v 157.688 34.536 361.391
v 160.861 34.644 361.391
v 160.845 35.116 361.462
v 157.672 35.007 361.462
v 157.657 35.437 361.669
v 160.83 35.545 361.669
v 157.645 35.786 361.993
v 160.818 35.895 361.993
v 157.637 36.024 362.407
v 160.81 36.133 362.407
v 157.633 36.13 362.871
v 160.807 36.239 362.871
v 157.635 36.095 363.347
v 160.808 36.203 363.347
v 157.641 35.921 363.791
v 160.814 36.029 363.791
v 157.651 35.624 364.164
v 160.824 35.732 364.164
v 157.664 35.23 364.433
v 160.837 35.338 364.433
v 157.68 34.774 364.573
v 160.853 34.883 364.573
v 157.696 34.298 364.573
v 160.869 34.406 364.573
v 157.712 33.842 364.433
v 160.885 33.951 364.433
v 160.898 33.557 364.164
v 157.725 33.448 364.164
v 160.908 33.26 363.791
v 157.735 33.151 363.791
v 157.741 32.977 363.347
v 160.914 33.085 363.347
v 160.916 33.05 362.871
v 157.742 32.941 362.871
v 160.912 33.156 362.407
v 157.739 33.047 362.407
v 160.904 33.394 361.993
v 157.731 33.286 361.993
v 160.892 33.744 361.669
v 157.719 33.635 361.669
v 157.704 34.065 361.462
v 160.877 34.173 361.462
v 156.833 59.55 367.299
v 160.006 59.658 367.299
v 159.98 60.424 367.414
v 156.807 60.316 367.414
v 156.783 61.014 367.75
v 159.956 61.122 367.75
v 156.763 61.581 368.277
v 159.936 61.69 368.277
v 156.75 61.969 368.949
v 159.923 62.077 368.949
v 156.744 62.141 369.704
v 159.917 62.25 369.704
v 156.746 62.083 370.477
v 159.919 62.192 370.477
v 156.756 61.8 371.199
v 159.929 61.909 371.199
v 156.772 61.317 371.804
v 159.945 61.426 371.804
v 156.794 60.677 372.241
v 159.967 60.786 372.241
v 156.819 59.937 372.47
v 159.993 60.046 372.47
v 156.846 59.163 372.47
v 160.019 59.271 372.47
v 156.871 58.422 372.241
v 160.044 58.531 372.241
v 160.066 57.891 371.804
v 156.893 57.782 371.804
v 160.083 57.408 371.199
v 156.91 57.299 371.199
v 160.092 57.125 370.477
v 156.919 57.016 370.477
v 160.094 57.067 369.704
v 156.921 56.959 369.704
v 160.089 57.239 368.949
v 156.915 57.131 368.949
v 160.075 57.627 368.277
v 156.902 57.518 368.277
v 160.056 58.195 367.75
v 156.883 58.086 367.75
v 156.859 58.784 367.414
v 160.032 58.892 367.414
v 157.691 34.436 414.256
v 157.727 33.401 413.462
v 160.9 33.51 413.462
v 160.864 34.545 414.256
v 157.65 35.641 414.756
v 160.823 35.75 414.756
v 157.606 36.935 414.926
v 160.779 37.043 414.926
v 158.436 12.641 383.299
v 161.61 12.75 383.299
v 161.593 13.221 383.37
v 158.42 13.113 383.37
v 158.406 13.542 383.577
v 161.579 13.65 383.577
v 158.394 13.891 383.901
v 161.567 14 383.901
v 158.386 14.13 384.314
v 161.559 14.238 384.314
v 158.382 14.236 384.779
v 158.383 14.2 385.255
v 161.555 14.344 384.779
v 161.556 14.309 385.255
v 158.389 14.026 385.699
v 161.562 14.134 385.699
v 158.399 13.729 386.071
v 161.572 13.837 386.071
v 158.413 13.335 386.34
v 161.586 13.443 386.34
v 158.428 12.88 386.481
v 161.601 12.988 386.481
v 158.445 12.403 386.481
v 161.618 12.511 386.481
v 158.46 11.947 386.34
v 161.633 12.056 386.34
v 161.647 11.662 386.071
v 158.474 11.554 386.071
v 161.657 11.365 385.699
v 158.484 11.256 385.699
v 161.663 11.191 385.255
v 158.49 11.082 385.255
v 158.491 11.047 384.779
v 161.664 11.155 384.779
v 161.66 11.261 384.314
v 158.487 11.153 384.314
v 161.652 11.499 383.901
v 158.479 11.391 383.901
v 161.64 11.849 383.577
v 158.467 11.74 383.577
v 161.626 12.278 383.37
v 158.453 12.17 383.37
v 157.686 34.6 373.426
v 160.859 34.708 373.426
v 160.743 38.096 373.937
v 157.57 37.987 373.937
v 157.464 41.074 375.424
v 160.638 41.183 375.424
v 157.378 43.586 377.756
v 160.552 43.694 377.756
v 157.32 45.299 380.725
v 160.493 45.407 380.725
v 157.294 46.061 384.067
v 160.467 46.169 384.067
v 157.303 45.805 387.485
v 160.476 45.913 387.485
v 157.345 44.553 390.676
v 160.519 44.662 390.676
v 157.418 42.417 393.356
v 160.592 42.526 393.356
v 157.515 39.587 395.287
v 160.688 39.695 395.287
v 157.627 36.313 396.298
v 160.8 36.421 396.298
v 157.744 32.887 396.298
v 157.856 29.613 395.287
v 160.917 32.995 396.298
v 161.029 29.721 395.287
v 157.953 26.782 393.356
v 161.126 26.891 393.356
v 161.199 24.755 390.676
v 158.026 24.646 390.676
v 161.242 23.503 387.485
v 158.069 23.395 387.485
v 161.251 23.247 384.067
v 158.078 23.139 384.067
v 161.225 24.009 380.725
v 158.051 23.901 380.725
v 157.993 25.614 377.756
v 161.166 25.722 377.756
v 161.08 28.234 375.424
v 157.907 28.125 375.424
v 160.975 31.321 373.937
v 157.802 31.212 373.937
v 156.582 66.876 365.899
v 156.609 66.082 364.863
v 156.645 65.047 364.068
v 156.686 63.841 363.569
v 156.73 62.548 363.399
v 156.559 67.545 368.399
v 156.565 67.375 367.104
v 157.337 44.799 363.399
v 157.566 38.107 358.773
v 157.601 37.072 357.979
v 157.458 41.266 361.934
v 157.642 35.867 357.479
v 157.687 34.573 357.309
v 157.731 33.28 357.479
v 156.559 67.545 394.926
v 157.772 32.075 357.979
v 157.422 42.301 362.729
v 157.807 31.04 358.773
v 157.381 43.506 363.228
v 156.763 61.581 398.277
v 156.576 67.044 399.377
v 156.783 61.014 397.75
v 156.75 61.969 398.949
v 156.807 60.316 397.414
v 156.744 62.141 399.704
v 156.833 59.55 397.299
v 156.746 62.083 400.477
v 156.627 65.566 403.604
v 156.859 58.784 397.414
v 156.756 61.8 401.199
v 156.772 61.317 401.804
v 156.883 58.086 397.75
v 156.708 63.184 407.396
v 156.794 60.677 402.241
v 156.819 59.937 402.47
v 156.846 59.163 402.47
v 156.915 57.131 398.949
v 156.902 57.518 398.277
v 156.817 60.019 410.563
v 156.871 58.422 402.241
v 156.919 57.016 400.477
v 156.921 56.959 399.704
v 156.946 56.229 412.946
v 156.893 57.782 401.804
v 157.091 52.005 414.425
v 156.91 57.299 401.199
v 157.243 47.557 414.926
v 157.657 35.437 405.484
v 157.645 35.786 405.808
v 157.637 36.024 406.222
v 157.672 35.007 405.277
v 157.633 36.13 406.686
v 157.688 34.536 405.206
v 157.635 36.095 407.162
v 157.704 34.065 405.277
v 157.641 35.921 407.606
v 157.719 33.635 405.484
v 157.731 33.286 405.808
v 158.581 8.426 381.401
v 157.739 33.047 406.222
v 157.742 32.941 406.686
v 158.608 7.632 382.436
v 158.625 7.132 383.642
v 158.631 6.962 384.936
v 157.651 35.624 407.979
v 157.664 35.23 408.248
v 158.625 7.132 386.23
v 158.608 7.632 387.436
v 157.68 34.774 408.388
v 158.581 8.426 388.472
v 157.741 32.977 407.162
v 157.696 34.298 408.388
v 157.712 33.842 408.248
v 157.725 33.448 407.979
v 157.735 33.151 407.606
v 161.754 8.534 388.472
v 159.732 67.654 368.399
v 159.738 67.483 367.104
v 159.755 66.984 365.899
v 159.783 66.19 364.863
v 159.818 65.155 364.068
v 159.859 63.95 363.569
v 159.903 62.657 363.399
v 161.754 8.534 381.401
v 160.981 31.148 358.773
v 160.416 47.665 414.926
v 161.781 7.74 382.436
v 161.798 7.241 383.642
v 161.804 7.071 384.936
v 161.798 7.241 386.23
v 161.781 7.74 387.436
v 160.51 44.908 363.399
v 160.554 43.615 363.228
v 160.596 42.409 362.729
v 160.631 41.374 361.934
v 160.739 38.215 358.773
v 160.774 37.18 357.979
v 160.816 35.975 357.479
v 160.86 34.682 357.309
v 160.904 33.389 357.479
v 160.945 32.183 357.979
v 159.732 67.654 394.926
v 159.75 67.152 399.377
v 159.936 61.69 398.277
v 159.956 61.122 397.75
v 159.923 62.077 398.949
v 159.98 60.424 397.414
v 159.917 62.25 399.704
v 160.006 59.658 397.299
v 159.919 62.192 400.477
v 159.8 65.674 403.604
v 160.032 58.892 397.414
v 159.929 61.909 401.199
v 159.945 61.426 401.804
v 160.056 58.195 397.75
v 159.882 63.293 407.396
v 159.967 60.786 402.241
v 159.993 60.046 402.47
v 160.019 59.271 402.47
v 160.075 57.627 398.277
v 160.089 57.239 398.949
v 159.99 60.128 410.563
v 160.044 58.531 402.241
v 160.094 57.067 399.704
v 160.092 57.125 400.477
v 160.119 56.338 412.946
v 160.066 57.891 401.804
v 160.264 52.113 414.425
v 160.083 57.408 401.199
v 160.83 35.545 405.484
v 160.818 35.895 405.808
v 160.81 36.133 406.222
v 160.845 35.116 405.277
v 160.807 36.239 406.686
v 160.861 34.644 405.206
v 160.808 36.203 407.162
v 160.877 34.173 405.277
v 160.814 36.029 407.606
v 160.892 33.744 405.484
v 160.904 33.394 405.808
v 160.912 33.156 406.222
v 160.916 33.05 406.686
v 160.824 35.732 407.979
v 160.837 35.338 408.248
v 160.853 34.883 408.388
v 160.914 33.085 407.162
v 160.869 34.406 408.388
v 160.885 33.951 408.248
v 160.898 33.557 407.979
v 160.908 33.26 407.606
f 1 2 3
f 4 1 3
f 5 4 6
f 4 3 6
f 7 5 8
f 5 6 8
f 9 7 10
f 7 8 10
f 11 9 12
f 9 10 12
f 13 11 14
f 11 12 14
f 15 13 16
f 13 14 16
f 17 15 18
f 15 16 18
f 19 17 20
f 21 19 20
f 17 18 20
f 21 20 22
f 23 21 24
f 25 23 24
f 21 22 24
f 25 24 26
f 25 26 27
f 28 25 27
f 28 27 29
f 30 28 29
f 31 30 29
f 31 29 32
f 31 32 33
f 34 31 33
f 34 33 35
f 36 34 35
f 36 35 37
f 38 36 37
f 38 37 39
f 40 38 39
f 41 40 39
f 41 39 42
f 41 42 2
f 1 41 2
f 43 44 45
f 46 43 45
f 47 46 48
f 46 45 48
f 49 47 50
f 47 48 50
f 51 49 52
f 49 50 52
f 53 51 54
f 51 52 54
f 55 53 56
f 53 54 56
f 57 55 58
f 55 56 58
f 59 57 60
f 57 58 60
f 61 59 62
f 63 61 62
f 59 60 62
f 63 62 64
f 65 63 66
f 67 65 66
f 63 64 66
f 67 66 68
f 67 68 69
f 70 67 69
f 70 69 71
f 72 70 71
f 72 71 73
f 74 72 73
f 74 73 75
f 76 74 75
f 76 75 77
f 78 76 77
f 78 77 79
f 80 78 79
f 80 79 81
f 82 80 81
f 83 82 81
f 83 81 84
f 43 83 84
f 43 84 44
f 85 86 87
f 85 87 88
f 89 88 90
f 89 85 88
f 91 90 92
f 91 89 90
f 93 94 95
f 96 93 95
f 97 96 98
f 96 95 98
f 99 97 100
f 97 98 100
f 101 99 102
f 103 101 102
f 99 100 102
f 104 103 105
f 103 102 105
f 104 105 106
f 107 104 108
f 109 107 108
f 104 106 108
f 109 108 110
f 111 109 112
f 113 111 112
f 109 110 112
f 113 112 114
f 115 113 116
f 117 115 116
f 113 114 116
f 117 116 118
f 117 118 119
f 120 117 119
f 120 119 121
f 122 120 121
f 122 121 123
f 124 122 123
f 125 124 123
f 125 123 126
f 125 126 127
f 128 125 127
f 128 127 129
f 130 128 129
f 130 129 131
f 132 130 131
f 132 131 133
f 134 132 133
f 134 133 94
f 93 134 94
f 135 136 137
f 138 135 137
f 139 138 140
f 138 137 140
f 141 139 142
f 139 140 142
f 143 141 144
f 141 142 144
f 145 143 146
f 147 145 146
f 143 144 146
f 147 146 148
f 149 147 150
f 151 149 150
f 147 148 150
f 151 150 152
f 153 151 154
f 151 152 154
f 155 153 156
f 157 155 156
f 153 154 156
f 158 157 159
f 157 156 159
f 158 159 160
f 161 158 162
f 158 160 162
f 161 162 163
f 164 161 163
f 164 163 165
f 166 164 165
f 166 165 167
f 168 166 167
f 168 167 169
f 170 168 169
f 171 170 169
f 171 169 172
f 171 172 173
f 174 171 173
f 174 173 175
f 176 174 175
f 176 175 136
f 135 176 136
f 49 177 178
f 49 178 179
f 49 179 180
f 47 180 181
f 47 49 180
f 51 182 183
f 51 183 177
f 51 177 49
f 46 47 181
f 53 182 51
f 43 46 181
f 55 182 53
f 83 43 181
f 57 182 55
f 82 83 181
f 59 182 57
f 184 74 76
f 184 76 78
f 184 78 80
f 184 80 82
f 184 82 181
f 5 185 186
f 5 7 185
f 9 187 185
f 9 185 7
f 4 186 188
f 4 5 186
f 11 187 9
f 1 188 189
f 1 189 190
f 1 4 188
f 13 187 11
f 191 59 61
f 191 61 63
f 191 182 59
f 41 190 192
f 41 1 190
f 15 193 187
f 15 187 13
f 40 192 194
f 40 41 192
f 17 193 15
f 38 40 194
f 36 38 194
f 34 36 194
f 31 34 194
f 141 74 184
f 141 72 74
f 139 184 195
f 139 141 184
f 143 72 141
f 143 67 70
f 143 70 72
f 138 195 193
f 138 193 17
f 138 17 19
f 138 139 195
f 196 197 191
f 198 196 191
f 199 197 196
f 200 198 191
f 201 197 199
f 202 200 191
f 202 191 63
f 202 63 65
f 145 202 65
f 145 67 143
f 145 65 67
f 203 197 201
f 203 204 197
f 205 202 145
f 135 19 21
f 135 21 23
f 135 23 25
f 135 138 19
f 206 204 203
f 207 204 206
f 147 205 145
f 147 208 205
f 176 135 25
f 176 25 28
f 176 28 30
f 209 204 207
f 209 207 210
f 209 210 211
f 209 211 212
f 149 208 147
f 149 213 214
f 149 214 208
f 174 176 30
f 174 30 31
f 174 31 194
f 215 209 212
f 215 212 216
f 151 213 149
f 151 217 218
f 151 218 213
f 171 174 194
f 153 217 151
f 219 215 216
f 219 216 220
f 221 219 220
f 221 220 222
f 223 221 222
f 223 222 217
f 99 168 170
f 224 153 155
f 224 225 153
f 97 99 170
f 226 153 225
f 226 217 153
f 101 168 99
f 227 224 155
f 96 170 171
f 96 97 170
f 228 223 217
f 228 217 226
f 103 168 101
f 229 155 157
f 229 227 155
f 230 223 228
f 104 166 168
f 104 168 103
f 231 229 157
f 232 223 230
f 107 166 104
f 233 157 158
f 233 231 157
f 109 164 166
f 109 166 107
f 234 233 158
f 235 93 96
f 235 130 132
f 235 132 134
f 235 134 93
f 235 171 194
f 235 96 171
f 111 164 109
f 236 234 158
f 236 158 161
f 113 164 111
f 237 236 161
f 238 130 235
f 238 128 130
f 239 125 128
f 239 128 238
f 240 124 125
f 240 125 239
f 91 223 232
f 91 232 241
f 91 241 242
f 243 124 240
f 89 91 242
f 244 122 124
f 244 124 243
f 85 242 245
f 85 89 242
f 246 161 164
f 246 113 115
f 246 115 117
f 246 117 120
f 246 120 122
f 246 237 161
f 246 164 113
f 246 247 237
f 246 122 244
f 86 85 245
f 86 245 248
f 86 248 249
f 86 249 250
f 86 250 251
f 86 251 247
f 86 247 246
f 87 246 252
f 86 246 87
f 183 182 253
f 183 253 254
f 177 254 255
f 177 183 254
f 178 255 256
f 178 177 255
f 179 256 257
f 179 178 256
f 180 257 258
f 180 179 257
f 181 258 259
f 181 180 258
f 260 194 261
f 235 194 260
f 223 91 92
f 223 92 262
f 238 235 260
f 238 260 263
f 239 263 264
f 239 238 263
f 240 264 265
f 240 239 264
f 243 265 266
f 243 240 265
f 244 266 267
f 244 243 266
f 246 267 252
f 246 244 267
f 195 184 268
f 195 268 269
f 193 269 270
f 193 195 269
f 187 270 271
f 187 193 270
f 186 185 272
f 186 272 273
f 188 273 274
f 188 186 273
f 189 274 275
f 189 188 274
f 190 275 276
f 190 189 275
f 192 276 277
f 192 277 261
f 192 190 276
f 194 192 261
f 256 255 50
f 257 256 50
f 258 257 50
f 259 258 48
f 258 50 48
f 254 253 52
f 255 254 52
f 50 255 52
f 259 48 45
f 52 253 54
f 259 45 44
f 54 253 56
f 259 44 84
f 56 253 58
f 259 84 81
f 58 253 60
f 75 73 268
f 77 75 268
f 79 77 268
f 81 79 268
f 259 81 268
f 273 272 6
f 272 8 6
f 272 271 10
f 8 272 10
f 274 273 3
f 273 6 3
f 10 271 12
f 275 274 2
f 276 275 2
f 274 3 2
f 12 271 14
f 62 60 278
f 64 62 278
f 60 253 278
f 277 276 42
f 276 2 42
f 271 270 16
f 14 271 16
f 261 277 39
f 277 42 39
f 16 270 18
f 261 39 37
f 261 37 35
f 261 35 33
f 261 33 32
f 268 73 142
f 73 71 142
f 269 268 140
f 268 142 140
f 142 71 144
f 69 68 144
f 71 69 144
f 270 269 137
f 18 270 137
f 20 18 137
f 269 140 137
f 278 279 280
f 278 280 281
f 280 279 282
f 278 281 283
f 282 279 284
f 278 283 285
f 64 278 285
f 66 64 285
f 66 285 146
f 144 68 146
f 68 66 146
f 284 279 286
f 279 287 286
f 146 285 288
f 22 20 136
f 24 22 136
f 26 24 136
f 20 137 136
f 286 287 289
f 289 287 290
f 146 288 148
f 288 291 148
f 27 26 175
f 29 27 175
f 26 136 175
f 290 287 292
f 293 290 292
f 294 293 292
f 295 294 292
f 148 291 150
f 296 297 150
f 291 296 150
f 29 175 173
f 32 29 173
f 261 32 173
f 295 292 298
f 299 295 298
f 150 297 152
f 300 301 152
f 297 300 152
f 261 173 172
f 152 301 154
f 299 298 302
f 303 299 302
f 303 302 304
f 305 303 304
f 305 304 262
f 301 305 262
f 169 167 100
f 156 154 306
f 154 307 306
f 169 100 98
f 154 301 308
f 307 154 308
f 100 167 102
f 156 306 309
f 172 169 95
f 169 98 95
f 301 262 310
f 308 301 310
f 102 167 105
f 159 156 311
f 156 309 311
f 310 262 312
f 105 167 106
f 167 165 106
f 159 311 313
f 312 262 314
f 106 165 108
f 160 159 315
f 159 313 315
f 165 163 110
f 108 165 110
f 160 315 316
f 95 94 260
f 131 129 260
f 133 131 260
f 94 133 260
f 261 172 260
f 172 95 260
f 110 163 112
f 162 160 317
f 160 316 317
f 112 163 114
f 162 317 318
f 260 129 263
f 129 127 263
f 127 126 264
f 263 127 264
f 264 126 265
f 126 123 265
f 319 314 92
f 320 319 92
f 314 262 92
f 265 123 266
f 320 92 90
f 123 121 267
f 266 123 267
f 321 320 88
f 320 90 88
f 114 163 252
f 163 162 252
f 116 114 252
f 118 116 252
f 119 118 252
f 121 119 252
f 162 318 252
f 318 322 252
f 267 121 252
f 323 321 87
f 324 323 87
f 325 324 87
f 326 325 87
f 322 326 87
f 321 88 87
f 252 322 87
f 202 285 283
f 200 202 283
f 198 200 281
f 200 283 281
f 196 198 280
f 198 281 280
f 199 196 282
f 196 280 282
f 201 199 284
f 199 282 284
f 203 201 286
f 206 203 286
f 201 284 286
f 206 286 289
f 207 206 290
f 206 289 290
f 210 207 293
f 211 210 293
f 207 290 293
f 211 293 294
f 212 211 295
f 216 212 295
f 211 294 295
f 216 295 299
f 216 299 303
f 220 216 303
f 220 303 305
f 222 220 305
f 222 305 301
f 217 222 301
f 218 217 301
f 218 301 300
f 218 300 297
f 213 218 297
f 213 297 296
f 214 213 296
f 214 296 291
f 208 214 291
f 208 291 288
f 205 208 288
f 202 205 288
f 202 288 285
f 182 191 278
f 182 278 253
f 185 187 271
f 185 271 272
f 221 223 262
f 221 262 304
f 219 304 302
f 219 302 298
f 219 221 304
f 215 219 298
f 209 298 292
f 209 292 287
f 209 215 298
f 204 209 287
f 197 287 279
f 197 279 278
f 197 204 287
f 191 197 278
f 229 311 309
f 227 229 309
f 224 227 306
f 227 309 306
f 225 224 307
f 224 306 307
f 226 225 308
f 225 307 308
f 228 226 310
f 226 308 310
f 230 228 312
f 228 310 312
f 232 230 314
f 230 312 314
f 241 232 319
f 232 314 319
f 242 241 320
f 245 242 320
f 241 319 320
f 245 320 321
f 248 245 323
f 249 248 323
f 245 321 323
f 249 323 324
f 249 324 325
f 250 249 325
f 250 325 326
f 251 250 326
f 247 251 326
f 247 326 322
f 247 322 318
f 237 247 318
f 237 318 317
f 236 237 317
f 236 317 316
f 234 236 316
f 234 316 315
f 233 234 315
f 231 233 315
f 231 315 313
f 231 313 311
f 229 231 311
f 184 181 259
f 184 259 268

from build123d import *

# Parameters (mm, degrees)
BASE_FLANGE1_DEPTH             = 3.175
F_23_0_23_DIAMETER_HOLE1_D     = 23
F_23_0_23_DIAMETER_HOLE1_DEPTH = 5.245059642
F_5_2_5_2_DIAMETER_HOLE1_D     = 5.2
F_5_2_5_2_DIAMETER_HOLE1_DEPTH = 5.245059642
F_3_2_3_2_DIAMETER_HOLE1_D     = 3.2
F_3_2_3_2_DIAMETER_HOLE1_DEPTH = 5.245059642


# Sheet-metal steps are written as plain solids
with BuildPart() as part:
    # Sketch11 → Base-Flange1 (new body)
    with BuildSketch(Plane(origin=(158.683156088, 5.425207604, 0), x_dir=(0.03416896788300158, -0.9994160703299755, 0), z_dir=(-0.9994160703299755, -0.03416896788300158, -1.3885688057658037e-15))):
        with BuildLine():
            Line((-62.15623968, 394.926215189), (-62.15623968, 368.398551724))
            ThreePointArc((-62.15623968, 368.398551724), (-60.691773586, 364.863017818), (-57.15623968, 363.398551724))
            Line((-57.15623968, 363.398551724), (-39.397236161, 363.398551724))
            ThreePointArc((-39.397236161, 363.398551724), (-37.483818999, 363.017949386), (-35.861702255, 361.93408563))
            Line((-35.861702255, 361.93408563), (-32.700762633, 358.773146007))
            ThreePointArc((-32.700762633, 358.773146007), (-29.165228727, 357.308679913), (-25.629694821, 358.773146007))
            Line((-25.629694821, 358.773146007), (-3.002277823, 381.400563005))
            ThreePointArc((-3.002277823, 381.400563005), (-1.537811729, 384.936096911), (-3.002277823, 388.471630817))
            Line((-3.002277823, 388.471630817), (-27.992396101, 413.461749095))
            ThreePointArc((-27.992396101, 413.461749095), (-29.614512845, 414.545612852), (-31.527930007, 414.926215189))
            Line((-31.527930007, 414.926215189), (-42.15623968, 414.926215189))
            ThreePointArc((-42.15623968, 414.926215189), (-56.298375303, 409.068350813), (-62.15623968, 394.926215189))
        make_face()
    extrude(amount=-BASE_FLANGE1_DEPTH)

    # Ø23.0 (23) Diameter Hole1
    with Locations(Plane(origin=(158.683156088, 5.425207604, 0), x_dir=(0, 0, 1), z_dir=(-0.9994160703299755, -0.03416896788300158, -1.3885688057658039e-15))):
        with Locations((384.926215189, 29.191594771)):
            Hole(F_23_0_23_DIAMETER_HOLE1_D / 2, depth=F_23_0_23_DIAMETER_HOLE1_DEPTH)

    # Ø5.2 (5.2) Diameter Hole1
    with Locations(Plane(origin=(158.683156088, 5.425207604, 0), x_dir=(0, 0, 1), z_dir=(-0.9994160703299755, -0.03416896788300158, -1.3885688057658039e-15))):
        with Locations((369.898551724, 54.15623968), (399.898551724, 54.15623968)):
            Hole(F_5_2_5_2_DIAMETER_HOLE1_D / 2, depth=F_5_2_5_2_DIAMETER_HOLE1_DEPTH)

    # Ø3.2 (3.2) Diameter Hole1
    with Locations(Plane(origin=(158.683156088, 5.425207604, 0), x_dir=(0, 0, 1), z_dir=(-0.9994160703299755, -0.03416896788300158, -1.3885688057658039e-15))):
        with Locations((406.806051724, 29.127683539), (362.991051724, 29.127683539), (384.898551724, 7.220183539)):
            Hole(F_3_2_3_2_DIAMETER_HOLE1_D / 2, depth=F_3_2_3_2_DIAMETER_HOLE1_DEPTH)


solid = part.part
